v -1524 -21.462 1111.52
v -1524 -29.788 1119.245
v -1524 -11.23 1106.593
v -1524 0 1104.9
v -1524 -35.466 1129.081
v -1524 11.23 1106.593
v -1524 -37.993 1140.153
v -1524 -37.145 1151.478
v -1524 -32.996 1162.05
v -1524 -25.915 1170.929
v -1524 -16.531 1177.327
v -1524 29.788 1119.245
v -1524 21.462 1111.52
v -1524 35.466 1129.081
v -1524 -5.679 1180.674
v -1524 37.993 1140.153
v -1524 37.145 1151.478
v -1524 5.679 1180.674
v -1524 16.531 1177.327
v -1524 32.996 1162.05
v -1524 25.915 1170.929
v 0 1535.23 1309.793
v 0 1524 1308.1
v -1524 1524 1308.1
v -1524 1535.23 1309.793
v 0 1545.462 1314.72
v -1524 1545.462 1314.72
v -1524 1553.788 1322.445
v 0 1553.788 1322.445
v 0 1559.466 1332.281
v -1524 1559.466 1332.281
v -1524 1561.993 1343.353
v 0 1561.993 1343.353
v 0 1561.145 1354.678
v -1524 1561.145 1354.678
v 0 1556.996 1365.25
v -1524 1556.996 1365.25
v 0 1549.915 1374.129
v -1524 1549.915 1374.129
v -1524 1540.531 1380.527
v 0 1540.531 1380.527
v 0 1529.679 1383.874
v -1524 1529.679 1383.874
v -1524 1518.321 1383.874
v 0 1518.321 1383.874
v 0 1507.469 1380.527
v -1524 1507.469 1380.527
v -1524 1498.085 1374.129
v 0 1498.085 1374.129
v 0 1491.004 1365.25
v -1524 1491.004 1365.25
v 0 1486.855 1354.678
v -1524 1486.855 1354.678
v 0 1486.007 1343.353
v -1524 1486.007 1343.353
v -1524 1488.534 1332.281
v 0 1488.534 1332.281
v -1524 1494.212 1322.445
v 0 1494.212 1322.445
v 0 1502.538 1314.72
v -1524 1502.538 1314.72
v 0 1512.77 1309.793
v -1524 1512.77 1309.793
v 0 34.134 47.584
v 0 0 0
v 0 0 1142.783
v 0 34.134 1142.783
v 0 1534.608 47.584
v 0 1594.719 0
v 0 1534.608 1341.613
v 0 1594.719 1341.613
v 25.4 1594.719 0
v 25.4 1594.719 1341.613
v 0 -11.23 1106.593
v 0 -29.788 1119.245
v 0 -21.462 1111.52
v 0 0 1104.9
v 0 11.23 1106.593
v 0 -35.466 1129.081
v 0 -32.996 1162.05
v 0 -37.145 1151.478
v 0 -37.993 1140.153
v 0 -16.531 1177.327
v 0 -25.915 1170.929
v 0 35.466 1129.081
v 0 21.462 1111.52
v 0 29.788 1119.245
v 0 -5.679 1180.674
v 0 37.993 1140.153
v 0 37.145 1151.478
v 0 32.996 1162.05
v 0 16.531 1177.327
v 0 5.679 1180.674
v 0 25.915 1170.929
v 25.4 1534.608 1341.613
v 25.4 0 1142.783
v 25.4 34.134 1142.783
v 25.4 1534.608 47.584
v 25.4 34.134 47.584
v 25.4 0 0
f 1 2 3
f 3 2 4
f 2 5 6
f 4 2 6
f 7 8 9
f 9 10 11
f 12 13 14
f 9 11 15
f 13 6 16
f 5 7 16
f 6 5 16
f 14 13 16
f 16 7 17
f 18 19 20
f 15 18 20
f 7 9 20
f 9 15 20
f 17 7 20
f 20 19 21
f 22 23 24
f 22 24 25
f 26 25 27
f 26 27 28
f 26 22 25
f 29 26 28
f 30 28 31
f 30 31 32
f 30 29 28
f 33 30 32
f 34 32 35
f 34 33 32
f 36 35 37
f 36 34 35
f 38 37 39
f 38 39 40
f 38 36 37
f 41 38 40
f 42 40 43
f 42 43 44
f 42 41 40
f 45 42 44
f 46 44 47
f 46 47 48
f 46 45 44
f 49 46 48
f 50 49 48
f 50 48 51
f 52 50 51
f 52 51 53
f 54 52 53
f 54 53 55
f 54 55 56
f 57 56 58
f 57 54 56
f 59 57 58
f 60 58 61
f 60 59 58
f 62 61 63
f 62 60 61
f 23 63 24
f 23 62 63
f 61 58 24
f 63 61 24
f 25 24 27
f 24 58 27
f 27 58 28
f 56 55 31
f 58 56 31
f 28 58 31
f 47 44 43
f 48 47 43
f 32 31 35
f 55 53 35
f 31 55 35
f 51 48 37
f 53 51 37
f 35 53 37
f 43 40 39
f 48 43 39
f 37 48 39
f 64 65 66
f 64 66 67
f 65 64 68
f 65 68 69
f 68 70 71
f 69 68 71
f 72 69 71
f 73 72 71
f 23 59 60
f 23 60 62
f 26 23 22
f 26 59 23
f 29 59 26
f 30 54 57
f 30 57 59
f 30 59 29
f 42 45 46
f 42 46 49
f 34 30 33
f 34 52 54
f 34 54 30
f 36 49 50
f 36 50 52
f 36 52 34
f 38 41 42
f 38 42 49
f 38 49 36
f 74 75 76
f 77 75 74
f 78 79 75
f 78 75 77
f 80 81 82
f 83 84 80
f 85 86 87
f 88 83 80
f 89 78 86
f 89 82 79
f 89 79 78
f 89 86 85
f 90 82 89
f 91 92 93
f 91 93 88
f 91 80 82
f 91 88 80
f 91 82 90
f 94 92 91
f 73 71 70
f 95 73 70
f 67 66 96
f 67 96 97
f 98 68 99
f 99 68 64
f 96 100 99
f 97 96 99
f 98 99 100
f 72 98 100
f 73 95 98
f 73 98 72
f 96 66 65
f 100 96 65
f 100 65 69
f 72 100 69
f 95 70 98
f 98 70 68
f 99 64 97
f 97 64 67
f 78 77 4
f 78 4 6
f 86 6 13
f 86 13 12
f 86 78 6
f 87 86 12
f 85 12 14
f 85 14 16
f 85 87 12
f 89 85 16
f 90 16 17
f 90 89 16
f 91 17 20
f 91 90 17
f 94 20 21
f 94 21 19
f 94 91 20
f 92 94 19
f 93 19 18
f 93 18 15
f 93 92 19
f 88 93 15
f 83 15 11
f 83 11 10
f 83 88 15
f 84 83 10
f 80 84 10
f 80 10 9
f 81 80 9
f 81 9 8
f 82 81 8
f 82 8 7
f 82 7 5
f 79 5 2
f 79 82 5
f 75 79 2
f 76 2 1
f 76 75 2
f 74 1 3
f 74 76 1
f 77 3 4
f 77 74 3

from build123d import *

# Parameters (mm, degrees)
F1_DEPTH = 1524
F2_W     = 34.133695066
F2_H     = 47.5836582482
F2_W_2   = 1500.4738345742
F2_H_2   = 1095.1993875206
F3_DEPTH = 25.4


with BuildPart() as f1:
    # F0 (on Right) → F1 (new body)
    with BuildSketch(Plane.YZ):
        with BuildLine():
            ThreePointArc((38.1, 1143), (-26.9407683632, 1169.9407683632), (0, 1104.9))
            ThreePointArc((0, 1104.9), (26.9407683632, 1116.0592316368), (38.1, 1143))
        make_face()
    extrude(amount=-F1_DEPTH)


with BuildPart() as f1b:
    # F0 (on Right) → F1, piece 2 (new body)
    with BuildSketch(Plane.YZ):
        with BuildLine():
            ThreePointArc((1562.1, 1346.2), (1497.0592316368, 1373.1407683632), (1524, 1308.1))
            ThreePointArc((1524, 1308.1), (1550.9407683632, 1319.2592316368), (1562.1, 1346.2))
        make_face()
    extrude(amount=-F1_DEPTH)


with BuildPart() as f3:
    # F2 (on Right) → F3 (new body)
    with BuildSketch(Plane.YZ):
        with Locations((17.066847533, 23.7918291241)):
            Rectangle(F2_W, F2_H)
        Polygon((1534.6075296402, 1341.6131734848), (1534.6075296402, 47.5836582482), (1534.6075296402, 0), (1594.7189331055, 0), (1594.7189331055, 1341.6131734848), align=None)
        with Locations((784.3706123531, 23.7918291241)):
            Rectangle(F2_W_2, F2_H)
        with Locations((17.066847533, 595.1833520085)):
            Rectangle(F2_W, F2_H_2)
    extrude(amount=F3_DEPTH)


solid = Compound([f1.part, f1b.part, f3.part])
